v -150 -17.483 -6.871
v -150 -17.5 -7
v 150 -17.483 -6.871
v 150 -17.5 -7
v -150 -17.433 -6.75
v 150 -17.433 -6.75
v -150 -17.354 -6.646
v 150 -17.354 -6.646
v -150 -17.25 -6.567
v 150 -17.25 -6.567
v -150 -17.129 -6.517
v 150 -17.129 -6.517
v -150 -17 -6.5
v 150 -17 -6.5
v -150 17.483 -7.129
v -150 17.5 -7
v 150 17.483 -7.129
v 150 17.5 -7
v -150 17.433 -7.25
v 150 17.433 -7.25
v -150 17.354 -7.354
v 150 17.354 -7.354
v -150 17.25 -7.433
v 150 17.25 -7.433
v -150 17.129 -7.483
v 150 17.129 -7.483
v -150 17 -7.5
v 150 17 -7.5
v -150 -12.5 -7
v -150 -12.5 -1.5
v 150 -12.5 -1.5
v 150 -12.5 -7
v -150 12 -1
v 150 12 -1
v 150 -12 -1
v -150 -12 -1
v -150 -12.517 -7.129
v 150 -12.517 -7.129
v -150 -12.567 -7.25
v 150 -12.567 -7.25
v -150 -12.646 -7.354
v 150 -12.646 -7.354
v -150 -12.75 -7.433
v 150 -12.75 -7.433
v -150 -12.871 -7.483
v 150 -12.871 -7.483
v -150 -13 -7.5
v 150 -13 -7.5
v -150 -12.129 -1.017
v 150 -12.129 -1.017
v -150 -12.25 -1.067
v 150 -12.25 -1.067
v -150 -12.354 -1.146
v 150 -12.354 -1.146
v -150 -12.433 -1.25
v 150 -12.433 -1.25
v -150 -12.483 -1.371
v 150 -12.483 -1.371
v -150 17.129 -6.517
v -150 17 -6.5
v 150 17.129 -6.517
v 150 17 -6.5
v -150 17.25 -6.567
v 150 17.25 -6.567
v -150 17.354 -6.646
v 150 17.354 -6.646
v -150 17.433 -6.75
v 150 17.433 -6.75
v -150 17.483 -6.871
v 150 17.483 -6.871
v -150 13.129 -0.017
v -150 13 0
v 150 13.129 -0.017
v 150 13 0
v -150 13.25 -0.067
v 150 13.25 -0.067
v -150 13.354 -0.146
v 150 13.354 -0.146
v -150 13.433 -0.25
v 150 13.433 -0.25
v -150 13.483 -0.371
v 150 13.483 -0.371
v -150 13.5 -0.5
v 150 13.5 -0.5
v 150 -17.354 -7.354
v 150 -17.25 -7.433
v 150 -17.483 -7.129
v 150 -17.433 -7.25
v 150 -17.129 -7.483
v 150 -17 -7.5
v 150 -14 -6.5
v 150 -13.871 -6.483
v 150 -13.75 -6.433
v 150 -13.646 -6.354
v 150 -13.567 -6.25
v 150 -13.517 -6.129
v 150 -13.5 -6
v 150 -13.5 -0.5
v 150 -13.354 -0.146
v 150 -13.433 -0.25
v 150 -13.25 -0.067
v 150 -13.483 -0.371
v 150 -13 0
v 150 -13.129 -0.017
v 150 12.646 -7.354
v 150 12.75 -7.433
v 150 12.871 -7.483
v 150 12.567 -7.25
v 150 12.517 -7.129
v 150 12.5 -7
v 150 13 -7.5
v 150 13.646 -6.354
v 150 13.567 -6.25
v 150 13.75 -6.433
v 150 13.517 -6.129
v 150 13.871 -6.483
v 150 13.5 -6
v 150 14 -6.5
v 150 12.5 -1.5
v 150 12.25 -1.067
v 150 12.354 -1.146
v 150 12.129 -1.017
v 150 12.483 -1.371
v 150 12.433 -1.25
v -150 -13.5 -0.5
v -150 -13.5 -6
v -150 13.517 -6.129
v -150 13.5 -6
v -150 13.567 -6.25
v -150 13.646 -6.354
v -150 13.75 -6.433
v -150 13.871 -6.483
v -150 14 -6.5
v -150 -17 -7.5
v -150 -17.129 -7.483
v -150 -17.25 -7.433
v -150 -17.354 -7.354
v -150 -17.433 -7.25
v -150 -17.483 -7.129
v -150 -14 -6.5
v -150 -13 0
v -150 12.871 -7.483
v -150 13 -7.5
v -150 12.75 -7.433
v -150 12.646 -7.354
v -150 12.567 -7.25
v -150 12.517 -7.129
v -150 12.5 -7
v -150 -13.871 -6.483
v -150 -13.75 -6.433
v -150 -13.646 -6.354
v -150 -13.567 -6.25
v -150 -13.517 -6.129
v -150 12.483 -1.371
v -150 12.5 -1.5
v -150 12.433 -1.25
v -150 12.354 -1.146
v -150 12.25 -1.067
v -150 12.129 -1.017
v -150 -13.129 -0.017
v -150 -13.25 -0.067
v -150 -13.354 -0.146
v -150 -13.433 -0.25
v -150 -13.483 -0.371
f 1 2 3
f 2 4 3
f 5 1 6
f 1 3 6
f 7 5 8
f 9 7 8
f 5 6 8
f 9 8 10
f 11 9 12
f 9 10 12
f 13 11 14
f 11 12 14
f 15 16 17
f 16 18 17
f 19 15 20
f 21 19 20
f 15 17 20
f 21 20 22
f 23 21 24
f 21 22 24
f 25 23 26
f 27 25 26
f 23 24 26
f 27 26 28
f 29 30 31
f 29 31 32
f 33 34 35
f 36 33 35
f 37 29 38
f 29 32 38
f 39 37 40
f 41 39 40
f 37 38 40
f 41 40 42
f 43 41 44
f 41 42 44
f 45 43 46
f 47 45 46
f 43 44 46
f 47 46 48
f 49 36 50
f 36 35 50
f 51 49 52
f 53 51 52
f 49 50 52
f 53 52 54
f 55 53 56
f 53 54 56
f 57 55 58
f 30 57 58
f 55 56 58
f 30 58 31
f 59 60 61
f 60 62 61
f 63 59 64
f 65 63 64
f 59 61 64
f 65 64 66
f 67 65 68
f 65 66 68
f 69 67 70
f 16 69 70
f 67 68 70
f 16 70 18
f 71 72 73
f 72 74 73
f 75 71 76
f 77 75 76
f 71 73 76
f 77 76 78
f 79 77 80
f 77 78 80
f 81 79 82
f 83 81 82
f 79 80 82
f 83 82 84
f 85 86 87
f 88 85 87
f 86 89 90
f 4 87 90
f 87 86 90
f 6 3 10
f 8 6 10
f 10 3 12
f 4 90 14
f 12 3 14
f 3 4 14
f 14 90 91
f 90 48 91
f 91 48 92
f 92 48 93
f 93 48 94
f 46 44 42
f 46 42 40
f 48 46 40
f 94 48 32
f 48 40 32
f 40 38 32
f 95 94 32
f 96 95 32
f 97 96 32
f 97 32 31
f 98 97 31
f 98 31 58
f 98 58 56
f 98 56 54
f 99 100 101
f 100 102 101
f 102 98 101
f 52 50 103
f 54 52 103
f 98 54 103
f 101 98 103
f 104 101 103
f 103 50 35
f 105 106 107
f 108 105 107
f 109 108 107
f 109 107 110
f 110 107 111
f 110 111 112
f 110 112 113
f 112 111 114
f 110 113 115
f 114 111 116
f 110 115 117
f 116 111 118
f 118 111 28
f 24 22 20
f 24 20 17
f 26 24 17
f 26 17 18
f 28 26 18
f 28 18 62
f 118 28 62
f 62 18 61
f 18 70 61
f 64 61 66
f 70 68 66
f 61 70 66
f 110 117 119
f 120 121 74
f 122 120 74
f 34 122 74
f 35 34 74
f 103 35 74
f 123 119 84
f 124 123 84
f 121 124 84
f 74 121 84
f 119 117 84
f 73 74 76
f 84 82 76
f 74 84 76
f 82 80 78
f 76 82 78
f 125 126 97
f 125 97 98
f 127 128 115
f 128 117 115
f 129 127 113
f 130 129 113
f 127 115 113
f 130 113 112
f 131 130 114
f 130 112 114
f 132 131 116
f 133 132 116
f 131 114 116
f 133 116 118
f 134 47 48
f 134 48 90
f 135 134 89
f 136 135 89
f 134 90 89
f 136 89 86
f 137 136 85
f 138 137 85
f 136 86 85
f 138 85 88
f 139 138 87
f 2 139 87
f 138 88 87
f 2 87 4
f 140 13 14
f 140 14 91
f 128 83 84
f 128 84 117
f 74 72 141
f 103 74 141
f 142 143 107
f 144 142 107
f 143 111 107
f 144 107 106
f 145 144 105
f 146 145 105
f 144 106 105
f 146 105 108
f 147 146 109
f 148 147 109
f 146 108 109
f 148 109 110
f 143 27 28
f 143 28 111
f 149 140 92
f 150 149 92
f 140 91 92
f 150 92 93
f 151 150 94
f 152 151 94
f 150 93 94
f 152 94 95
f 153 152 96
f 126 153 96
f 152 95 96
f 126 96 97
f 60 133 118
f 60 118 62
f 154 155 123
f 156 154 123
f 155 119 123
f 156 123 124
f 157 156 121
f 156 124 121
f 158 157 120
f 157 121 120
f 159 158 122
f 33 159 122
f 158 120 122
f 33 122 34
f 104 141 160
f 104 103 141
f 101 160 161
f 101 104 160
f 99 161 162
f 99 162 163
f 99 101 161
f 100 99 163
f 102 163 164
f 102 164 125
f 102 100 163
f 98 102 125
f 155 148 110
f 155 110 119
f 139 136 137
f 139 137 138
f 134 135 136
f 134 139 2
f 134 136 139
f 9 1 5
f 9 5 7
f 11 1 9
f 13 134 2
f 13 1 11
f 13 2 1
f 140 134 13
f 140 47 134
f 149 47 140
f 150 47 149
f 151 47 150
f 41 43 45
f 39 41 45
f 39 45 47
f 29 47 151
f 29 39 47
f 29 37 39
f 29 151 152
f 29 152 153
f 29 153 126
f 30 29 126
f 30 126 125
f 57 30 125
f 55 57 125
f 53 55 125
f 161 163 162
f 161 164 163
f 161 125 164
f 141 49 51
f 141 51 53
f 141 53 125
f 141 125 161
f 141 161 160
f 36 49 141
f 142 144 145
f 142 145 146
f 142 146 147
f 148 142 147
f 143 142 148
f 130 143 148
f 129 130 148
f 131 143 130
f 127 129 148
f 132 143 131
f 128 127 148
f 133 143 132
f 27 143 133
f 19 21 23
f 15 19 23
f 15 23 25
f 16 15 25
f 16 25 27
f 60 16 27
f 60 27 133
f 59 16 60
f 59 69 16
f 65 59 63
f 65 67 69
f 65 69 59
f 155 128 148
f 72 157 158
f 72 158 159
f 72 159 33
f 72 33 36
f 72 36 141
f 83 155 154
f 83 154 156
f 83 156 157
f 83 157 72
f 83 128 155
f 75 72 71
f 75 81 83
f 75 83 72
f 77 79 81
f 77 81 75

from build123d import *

# Parameters (mm, degrees)
SALIENTE_EXTRUIR1_DEPTH      = 150
SALIENTE_EXTRUIR1_DEPTH_BACK = 150
REDONDEO1_R                  = 0.5


with BuildPart() as part:
    # Croquis1 → Saliente-Extruir1 (new, two sides: drawn at the far end of the back side and taken through both)
    with BuildSketch(Plane(origin=(0, 0, 0), x_dir=(0, 0, -1), z_dir=(1, 0, 0)).offset(-SALIENTE_EXTRUIR1_DEPTH_BACK)):
        Polygon((0, 0), (0, 13.5), (6.5, 13.5), (6.5, 17.5), (7.5, 17.5), (7.5, 12.5), (1, 12.5), (1, -12.5), (7.5, -12.5), (7.5, -17.5), (6.5, -17.5), (6.5, -13.5), (0, -13.5), align=None)
    extrude(amount=SALIENTE_EXTRUIR1_DEPTH + SALIENTE_EXTRUIR1_DEPTH_BACK)

    # Redondeo1
    redondeo1_edges = [part.edges().sort_by_distance(p)[0] for p in [
        (0, 12.5, -1),
        (0, 12.5, -7.5),
        (0, 17.5, -7.5),
        (0, 17.5, -6.5),
        (0, 13.5, 0),
        (0, 13.5, -6.5),
        (0, -13.5, 0),
        (0, -13.5, -6.5),
        (0, -17.5, -6.5),
        (0, -17.5, -7.5),
        (0, -12.5, -7.5),
        (0, -12.5, -1),
    ]]
    fillet(redondeo1_edges, radius=REDONDEO1_R - 0.0001)  # a hair under: the kernel refuses the full size


solid = part.part
